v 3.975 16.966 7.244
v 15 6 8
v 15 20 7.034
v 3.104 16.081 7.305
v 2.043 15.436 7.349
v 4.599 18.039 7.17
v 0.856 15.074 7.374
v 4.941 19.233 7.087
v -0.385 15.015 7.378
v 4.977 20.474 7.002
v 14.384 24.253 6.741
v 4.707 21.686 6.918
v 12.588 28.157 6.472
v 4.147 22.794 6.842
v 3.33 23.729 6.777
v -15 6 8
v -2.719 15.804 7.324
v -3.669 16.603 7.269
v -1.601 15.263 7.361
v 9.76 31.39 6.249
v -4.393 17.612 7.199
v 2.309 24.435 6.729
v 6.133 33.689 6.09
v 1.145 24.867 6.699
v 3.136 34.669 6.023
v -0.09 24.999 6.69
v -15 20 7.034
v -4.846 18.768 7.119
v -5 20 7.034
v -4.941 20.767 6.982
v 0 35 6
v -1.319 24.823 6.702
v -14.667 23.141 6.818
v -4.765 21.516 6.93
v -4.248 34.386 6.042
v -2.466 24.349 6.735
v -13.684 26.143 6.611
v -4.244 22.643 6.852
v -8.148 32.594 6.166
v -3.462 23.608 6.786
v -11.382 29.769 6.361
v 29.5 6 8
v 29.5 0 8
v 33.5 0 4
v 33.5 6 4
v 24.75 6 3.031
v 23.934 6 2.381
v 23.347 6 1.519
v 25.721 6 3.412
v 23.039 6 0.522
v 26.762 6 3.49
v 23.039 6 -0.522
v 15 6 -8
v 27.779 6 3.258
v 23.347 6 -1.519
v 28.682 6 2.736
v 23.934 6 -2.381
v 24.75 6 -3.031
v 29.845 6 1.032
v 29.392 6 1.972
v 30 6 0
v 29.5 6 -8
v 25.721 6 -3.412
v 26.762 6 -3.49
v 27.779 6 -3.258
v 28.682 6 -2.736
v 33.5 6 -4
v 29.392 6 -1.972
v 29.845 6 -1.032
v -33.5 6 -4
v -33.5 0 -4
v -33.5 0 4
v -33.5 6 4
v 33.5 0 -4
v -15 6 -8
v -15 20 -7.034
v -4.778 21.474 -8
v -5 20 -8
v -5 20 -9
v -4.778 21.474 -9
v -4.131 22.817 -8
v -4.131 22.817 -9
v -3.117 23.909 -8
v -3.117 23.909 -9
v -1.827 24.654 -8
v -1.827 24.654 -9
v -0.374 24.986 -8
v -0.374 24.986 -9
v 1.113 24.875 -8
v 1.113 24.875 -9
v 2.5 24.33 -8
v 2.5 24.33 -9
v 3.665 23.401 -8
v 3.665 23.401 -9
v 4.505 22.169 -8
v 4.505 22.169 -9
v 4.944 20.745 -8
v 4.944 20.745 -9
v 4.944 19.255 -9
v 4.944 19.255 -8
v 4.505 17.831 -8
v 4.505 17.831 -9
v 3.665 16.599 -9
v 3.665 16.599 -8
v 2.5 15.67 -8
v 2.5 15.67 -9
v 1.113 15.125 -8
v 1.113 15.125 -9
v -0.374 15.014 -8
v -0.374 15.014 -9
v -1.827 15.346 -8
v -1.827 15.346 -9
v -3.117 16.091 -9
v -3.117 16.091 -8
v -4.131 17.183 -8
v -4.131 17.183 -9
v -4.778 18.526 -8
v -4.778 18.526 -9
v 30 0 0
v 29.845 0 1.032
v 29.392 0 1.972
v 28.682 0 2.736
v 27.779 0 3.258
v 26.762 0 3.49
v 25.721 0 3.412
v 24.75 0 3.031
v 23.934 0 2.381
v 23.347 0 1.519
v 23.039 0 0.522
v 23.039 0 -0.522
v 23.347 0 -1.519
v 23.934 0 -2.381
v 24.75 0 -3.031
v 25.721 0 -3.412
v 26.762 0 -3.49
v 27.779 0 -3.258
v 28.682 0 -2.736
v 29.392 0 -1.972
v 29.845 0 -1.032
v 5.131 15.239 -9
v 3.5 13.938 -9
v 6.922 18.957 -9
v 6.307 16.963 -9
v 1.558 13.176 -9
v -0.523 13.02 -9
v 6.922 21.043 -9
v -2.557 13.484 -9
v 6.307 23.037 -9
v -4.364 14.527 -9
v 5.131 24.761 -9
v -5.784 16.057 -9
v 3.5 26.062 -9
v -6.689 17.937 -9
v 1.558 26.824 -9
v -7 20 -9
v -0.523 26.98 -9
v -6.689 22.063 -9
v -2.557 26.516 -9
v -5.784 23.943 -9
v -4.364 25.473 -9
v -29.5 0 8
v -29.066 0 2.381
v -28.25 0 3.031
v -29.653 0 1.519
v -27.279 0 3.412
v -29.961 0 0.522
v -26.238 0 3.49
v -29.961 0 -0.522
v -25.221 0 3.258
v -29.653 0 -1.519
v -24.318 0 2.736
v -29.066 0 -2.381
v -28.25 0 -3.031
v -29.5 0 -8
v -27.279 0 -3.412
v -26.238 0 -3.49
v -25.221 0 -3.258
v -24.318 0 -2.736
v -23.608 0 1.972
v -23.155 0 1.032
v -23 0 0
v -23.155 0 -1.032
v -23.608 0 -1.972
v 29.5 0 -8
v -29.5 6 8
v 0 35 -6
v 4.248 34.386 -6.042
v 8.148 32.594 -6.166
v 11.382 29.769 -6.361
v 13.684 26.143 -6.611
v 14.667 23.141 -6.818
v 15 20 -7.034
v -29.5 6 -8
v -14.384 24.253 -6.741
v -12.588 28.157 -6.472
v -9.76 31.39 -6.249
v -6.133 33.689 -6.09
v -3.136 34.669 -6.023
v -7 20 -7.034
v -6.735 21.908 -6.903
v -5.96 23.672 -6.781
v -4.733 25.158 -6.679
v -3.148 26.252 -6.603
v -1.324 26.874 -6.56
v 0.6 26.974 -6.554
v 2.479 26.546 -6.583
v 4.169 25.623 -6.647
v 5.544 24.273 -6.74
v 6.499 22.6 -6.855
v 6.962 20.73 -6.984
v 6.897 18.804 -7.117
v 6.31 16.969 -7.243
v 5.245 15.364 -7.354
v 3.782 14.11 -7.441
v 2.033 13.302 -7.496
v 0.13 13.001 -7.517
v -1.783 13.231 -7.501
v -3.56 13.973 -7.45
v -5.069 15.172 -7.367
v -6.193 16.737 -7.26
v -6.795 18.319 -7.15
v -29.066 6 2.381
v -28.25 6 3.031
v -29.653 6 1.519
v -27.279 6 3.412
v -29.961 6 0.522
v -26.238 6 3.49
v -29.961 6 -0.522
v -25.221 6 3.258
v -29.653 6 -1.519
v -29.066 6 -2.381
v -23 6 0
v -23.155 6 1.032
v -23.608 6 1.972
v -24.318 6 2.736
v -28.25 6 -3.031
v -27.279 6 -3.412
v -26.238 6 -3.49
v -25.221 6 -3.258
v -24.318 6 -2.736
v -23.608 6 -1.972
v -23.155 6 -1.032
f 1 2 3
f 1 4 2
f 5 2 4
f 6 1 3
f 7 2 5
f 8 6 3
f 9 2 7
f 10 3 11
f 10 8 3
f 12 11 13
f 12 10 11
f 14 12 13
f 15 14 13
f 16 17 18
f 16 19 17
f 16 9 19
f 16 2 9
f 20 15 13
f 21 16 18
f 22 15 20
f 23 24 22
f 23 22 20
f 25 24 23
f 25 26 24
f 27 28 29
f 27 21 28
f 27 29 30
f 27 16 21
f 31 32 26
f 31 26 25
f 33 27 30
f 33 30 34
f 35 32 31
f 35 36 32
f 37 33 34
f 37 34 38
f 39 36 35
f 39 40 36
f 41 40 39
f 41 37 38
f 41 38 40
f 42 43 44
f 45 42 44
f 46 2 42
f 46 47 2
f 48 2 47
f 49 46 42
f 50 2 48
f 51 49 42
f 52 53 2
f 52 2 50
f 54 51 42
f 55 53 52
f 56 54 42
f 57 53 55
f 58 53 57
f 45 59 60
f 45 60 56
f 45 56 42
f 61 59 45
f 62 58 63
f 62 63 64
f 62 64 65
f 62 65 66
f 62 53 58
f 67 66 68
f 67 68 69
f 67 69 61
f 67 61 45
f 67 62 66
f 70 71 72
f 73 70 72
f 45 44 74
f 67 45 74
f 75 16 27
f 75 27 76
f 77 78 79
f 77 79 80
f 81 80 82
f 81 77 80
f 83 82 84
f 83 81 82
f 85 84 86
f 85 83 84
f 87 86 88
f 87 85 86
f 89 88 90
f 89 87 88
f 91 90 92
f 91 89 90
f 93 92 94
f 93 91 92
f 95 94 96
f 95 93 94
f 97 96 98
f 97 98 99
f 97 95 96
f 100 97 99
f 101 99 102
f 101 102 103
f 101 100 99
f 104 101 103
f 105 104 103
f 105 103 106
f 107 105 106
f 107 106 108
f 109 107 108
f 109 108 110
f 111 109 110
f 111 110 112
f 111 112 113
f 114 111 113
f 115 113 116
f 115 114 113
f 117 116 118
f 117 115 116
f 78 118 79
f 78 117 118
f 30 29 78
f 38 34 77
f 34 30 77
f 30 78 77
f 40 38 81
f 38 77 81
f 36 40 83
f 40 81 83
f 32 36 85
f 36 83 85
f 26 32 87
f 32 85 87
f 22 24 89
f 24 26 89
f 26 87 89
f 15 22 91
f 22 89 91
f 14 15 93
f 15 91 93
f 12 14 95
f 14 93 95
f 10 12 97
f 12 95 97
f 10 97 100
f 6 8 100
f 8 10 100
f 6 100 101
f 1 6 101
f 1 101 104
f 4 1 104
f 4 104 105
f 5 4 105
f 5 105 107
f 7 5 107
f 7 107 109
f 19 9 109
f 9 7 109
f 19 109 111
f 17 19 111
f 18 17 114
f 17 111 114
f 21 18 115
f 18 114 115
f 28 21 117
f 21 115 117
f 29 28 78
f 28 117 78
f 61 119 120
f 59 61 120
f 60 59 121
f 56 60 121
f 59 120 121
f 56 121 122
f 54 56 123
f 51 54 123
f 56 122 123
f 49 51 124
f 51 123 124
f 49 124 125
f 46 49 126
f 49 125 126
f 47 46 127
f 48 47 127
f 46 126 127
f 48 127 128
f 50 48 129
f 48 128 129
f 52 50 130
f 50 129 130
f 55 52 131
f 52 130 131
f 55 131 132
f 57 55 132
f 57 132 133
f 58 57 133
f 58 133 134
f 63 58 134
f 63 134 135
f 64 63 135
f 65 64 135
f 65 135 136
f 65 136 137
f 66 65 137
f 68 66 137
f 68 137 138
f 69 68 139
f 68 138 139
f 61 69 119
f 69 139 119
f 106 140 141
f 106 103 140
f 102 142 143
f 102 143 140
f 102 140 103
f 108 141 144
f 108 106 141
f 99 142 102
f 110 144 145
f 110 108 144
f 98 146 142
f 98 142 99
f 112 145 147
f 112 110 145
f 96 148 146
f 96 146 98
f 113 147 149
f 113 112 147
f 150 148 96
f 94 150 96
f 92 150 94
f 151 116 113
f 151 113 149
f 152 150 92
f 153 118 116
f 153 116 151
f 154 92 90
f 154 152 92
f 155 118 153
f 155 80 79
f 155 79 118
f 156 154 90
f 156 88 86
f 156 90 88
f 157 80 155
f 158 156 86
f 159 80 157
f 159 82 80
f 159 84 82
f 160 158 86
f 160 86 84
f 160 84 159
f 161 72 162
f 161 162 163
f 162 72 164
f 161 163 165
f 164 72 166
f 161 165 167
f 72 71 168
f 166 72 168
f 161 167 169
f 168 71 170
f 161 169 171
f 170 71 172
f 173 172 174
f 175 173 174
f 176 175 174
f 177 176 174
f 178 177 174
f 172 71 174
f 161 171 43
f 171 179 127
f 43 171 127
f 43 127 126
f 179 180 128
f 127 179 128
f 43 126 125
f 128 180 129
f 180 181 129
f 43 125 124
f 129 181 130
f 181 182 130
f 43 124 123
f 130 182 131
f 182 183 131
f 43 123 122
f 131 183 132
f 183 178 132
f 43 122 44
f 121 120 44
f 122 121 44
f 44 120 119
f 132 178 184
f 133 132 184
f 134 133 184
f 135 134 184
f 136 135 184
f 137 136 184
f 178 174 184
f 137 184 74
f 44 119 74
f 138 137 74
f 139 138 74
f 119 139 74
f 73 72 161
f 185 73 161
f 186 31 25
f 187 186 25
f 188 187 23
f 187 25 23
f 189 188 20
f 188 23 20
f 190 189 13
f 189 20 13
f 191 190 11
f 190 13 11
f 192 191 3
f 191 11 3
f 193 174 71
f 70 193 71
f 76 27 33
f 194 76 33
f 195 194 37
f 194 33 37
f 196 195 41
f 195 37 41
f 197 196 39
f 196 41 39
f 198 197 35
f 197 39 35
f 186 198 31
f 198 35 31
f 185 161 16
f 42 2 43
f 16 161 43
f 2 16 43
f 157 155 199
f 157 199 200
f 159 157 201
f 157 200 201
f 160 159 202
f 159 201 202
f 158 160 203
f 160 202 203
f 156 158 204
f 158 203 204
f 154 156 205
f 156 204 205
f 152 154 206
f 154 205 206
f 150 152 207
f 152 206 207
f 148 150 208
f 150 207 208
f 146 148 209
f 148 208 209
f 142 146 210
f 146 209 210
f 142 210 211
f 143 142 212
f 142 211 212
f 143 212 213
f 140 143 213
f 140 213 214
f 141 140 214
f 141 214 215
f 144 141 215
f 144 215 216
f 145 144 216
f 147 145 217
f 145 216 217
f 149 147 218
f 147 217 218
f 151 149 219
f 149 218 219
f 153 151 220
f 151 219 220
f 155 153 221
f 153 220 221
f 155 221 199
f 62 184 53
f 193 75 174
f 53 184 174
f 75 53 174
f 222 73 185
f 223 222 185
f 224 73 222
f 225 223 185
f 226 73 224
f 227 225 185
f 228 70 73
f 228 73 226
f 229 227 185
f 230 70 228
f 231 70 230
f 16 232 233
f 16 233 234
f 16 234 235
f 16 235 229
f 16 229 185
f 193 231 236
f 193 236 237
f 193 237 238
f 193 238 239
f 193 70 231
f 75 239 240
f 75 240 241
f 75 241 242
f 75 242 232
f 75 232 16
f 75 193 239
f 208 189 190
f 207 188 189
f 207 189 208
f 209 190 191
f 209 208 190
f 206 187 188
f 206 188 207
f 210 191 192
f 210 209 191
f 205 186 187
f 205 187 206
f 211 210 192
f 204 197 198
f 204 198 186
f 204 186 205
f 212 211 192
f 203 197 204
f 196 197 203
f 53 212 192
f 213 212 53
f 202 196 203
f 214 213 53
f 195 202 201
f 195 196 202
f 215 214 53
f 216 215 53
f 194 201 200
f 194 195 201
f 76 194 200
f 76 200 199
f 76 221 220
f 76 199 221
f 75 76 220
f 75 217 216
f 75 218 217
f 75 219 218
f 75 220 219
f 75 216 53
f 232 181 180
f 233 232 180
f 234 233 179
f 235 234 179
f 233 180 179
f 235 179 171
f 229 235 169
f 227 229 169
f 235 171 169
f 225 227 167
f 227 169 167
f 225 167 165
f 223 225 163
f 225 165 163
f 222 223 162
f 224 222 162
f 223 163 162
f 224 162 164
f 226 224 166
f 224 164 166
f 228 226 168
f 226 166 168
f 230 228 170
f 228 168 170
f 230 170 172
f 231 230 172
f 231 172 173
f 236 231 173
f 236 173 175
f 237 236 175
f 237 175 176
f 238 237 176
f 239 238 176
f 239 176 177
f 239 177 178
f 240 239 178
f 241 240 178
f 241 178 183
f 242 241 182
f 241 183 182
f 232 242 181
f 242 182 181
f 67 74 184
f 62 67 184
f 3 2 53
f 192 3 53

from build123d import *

# Parameters (mm, degrees)
BOSS_EXTRUDE2_DEPTH             = 6
SKETCH3_W                       = 30
SKETCH3_H                       = 16
BOSS_EXTRUDE3_DEPTH             = 29
CUT_EXTRUDE1_DEPTH              = 16
CUT_EXTRUDE2_DEPTH              = 30
SKETCH6_R                       = 3.5
CUT_EXTRUDE3_DEPTH              = 6
CUT_EXTRUDE4_REACH              = 18
SKETCH7_R                       = 5
BOSS_EXTRUDE4_REACH             = 18
SKETCH8_R                       = 7
SKETCH8_R_2                     = 5
BOSS_EXTRUDE4_DIRECTION_2_DEPTH = 1


with BuildPart() as part:
    # Sketch2 → Boss-Extrude2 (new body)
    with BuildSketch(Plane(origin=(0, 0, 0), x_dir=(1, 0, 0), z_dir=(0, 1, 0))):
        Polygon((-29.5, 8), (-33.5, 4), (-33.5, -4), (-29.5, -8), (29.5, -8), (33.5, -4), (33.5, 4), (29.5, 8), align=None)
    extrude(amount=BOSS_EXTRUDE2_DEPTH)

    # Sketch3 → Boss-Extrude3 (add)
    with BuildSketch(Plane(origin=(0, 6, 0), x_dir=(1, 0, 0), z_dir=(0, 1, 0))):
        Rectangle(SKETCH3_W, SKETCH3_H)
    extrude(amount=BOSS_EXTRUDE3_DEPTH)

    # Sketch4 → Cut-Extrude1 (cut)
    with BuildSketch(Plane.XY.offset(8)):
        with BuildLine():
            ThreePointArc((-15, 20), (-10.606601718, 30.606601718), (0, 35))
            Line((0, 35), (-15, 35))
            Line((-15, 35), (-15, 20))
        make_face()
        with BuildLine():
            Line((15, 20), (15, 35))
            Line((15, 35), (0, 35))
            ThreePointArc((0, 35), (10.606601718, 30.606601718), (15, 20))
        make_face()
    extrude(amount=-CUT_EXTRUDE1_DEPTH, mode=Mode.SUBTRACT)

    # Sketch5 → Cut-Extrude2 (cut)
    with BuildSketch(Plane.ZY.offset(15)):
        Polygon((-6, 35), (-8, 6), (-8, 35), align=None)
        Polygon((8, 6), (6, 35), (8, 35), align=None)
    extrude(amount=-CUT_EXTRUDE2_DEPTH, mode=Mode.SUBTRACT)

    # Sketch6 → Cut-Extrude3 (cut)
    with BuildSketch(Plane.XZ):
        with Locations((-26.5, 0)):
            Circle(SKETCH6_R)
        with Locations((26.5, 0)):
            Circle(SKETCH6_R)
    extrude(amount=-CUT_EXTRUDE3_DEPTH, mode=Mode.SUBTRACT)

    # Cut-Extrude4: up to this face of the body (flat: up to its plane)
    cut_extrude4_end = Plane(part.part.faces().sort_by_distance((0, 19.107869184, 7.096009022))[0])
    # Sketch7 → Cut-Extrude4 (cut, up to the picked face)
    with BuildSketch(Plane(origin=(0, 0, -8), x_dir=(-1, 0, 0), z_dir=(0, 0, -1)), mode=Mode.PRIVATE) as cut_extrude4_sk1:
        with Locations((0, 20)):
            Circle(SKETCH7_R)
    cut_extrude4_tool1 = split(extrude(cut_extrude4_sk1.sketch, amount=-CUT_EXTRUDE4_REACH, mode=Mode.PRIVATE), bisect_by=cut_extrude4_end, keep=Keep.BOTH, mode=Mode.PRIVATE)
    add(cut_extrude4_tool1.solids().sort_by_distance((0, 20, -8))[0], mode=Mode.SUBTRACT)

    # Sketch8 → Boss-Extrude4 (add, up to next)
    with BuildSketch(Plane(origin=(0, 0, -8), x_dir=(-1, 0, 0), z_dir=(0, 0, -1)), mode=Mode.PRIVATE) as boss_extrude4_sk1:
        with Locations((0, 20)):
            Circle(SKETCH8_R)
        with Locations((0, 20)):
            Circle(SKETCH8_R_2, mode=Mode.SUBTRACT)
    boss_extrude4_tool1 = extrude(boss_extrude4_sk1.sketch, amount=-BOSS_EXTRUDE4_REACH, mode=Mode.PRIVATE) - part.part
    add(boss_extrude4_tool1.solids().sort_by_distance((6.80201, 20, -8))[0])

    # Sketch8 → Boss-Extrude4 direction 2 (add)
    with BuildSketch(Plane(origin=(0, 0, -8), x_dir=(-1, 0, 0), z_dir=(0, 0, -1))):
        with Locations((0, 20)):
            Circle(SKETCH8_R)
        with Locations((0, 20)):
            Circle(SKETCH8_R_2, mode=Mode.SUBTRACT)
    extrude(amount=BOSS_EXTRUDE4_DIRECTION_2_DEPTH)


solid = part.part
